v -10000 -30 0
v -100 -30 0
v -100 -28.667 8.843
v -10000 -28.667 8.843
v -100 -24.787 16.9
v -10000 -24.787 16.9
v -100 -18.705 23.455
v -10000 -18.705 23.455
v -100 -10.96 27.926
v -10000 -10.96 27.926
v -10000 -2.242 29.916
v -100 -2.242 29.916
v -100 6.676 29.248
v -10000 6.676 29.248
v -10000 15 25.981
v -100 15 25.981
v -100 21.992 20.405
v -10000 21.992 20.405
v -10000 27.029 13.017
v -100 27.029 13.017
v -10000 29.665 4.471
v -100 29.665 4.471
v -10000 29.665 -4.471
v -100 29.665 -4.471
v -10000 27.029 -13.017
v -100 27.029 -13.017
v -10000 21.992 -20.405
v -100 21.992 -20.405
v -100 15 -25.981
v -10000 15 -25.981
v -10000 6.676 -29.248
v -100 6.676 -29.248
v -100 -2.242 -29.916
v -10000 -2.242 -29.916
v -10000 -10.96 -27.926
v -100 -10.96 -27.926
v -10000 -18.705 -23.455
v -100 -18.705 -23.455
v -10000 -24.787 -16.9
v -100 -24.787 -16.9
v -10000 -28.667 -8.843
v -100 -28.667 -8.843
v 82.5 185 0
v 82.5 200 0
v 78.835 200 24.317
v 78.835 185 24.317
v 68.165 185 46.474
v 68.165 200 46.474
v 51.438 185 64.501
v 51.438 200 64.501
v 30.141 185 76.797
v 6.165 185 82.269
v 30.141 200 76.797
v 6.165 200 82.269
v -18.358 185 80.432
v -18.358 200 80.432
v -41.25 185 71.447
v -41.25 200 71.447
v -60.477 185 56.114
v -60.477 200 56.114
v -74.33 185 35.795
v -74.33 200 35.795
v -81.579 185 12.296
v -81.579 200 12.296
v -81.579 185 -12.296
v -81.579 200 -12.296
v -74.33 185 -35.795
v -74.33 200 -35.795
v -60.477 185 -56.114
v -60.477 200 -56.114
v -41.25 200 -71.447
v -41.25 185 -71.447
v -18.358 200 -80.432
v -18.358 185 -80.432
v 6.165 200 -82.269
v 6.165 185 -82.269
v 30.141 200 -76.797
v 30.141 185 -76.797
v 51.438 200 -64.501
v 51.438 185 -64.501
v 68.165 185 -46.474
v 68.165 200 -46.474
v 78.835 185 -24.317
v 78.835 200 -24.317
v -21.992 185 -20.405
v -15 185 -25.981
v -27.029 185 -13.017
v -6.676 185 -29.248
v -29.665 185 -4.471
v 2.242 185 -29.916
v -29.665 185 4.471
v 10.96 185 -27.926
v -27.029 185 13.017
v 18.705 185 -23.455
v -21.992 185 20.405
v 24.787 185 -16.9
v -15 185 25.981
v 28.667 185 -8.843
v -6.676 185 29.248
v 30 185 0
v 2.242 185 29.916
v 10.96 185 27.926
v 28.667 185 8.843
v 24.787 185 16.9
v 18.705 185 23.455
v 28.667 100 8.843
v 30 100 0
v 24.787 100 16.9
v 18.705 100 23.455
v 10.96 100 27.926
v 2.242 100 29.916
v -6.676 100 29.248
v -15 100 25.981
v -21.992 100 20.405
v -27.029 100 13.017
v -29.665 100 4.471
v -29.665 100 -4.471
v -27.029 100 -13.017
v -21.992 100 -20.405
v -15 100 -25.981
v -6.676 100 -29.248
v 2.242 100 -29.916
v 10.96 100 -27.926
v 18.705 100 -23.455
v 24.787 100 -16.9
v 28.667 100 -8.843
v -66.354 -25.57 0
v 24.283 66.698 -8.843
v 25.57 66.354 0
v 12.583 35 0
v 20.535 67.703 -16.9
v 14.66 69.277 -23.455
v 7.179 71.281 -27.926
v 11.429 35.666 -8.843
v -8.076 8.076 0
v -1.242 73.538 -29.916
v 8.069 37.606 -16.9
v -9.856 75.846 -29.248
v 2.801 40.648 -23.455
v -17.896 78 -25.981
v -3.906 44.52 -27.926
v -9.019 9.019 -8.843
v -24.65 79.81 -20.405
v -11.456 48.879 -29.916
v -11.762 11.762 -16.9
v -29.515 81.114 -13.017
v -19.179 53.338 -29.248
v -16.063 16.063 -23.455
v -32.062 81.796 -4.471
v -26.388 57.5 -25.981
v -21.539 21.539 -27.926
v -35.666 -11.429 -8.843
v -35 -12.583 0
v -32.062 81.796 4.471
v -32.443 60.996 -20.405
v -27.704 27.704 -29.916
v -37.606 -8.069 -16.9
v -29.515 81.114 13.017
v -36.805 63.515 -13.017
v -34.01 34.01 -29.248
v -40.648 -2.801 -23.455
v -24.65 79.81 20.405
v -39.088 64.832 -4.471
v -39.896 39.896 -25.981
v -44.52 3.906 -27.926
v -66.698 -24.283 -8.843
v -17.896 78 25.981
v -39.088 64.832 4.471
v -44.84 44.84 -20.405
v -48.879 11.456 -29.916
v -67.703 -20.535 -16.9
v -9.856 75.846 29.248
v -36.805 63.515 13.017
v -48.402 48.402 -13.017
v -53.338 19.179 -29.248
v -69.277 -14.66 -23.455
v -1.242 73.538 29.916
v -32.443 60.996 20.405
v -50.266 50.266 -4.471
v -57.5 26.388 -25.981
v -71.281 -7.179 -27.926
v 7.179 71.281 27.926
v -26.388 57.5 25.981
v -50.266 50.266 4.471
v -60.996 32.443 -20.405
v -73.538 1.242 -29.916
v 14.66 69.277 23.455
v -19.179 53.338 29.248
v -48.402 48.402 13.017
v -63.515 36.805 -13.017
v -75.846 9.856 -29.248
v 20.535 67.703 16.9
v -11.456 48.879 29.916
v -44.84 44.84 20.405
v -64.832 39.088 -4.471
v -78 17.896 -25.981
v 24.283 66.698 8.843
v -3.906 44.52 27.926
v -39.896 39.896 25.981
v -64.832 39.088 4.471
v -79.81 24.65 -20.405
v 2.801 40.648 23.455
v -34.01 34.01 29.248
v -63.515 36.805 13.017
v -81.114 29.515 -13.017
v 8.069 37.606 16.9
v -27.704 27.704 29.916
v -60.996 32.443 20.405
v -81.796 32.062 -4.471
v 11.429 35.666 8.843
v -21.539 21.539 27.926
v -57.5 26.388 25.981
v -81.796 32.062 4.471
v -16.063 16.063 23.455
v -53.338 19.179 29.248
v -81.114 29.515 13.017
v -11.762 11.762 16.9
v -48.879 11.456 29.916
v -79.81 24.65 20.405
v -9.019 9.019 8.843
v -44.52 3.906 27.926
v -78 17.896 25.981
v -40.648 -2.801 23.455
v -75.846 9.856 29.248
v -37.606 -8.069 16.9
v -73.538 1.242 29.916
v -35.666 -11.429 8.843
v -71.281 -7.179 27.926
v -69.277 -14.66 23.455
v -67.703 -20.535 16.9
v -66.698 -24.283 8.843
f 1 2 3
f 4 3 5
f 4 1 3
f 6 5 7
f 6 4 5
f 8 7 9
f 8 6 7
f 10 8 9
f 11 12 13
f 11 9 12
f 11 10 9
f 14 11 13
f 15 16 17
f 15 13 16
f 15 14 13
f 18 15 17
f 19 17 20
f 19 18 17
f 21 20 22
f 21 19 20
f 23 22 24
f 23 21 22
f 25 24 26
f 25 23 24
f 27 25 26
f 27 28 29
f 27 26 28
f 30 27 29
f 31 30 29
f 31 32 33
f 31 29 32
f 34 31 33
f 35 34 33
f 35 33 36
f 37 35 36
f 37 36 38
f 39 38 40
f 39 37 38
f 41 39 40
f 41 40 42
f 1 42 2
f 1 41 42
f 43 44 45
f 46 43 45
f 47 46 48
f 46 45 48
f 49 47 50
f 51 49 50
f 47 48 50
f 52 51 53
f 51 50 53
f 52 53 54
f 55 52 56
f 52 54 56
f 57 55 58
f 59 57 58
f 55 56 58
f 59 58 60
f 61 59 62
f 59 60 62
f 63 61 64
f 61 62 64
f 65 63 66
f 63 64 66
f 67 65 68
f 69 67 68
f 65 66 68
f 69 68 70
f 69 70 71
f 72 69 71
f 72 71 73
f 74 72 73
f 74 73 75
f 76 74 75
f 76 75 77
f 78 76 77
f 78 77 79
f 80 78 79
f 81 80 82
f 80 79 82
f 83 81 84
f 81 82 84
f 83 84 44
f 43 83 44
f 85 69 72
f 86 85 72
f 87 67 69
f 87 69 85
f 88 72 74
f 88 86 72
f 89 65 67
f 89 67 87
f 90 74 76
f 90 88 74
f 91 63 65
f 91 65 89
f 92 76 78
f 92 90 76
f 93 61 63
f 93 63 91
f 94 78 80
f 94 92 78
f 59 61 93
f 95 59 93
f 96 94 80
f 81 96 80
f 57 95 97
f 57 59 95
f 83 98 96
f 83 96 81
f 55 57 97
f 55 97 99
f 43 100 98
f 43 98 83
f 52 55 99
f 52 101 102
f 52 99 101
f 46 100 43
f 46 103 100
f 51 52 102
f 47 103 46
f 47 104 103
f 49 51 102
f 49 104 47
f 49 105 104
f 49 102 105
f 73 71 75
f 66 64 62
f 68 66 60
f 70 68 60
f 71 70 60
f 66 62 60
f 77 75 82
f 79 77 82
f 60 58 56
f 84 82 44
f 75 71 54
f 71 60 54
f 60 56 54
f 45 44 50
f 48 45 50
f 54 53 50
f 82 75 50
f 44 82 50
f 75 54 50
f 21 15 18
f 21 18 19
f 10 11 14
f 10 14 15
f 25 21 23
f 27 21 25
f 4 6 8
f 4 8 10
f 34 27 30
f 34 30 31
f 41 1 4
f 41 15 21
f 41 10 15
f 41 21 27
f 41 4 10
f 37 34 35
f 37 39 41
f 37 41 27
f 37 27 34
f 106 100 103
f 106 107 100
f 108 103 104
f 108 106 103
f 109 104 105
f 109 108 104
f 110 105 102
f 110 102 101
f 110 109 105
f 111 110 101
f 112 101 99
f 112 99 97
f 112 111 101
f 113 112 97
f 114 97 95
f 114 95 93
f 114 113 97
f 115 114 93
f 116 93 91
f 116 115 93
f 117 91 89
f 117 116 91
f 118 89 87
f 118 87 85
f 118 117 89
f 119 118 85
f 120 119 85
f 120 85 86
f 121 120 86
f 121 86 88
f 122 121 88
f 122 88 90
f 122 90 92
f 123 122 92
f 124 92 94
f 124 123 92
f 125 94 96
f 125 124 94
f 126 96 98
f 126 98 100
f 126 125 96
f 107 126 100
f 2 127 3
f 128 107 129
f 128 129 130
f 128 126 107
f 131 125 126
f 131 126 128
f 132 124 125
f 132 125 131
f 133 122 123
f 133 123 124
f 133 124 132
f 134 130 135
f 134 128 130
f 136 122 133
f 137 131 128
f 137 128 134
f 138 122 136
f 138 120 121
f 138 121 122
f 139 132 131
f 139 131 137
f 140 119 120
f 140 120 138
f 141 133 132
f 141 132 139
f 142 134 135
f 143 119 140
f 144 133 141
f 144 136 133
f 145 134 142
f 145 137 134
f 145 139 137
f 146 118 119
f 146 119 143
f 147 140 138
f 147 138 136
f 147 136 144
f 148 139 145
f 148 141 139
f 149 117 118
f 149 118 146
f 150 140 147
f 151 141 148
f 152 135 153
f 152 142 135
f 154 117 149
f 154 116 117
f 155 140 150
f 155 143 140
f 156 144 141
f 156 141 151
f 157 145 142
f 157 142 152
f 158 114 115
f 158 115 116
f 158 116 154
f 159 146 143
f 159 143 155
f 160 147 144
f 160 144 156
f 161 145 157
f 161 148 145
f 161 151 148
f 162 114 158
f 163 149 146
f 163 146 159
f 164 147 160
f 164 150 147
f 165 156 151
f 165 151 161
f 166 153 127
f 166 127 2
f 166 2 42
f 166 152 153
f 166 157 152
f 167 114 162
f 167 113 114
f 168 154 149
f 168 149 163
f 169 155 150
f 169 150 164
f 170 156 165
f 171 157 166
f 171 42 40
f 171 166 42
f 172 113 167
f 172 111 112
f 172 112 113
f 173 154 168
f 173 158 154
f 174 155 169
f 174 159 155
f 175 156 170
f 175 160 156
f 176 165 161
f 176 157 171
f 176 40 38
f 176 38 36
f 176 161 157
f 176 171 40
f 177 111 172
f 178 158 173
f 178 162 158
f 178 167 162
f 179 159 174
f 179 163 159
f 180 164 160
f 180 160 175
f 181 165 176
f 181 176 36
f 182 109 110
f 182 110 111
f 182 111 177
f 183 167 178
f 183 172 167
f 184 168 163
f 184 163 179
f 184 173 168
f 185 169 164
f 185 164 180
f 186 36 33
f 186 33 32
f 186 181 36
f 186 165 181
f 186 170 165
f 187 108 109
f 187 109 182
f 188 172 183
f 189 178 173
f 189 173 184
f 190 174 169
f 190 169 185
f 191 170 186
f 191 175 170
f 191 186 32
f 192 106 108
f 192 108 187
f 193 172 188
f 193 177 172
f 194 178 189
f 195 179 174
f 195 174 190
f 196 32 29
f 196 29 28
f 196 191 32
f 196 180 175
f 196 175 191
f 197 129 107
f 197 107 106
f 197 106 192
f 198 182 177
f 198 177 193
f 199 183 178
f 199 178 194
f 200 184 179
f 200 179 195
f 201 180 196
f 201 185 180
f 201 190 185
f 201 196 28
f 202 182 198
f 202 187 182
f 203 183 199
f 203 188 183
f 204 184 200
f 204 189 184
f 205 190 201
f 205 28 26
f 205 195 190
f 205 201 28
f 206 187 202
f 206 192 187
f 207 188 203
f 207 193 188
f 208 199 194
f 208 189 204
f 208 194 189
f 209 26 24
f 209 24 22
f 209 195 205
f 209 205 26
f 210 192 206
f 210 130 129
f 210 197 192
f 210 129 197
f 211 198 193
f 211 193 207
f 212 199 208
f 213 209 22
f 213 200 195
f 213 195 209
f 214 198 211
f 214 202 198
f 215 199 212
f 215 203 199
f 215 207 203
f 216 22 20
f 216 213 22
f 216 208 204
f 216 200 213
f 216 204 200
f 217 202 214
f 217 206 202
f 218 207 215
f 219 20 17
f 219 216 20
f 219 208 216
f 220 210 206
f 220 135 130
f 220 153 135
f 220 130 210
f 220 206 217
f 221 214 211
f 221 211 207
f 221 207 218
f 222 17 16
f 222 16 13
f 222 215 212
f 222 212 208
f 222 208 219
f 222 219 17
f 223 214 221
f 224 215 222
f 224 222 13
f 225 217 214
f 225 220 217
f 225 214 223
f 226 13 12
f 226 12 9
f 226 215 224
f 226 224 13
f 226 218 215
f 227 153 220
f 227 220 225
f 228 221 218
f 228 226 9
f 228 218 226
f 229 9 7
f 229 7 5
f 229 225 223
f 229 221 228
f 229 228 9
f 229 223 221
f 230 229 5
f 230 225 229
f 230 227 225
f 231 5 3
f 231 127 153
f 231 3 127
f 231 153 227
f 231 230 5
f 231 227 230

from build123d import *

# Parameters (mm, degrees)
F2_R     = 30
F2_R_2   = 82.5
F4_DEPTH = 15


with BuildPart() as f3:
    # F3: sweep along a path in F0
    with BuildLine(Plane.XY) as f3_path:
        Line((0, 200), (0, 100))
        ThreePointArc((0, 100), (-29.2893218813, 29.2893218813), (-100, 0))
        Line((-100, 0), (-10000, 0))
    # F2 (on offset) → F3 (sweep)
    with BuildSketch(Plane.XZ.offset(-200)):
        Circle(F2_R)
    sweep(path=f3_path.line)

    # F2 (on offset) → F4 (join)
    with BuildSketch(Plane.XZ.offset(-200)):
        Circle(F2_R_2)
        Circle(F2_R, mode=Mode.SUBTRACT)
    extrude(amount=F4_DEPTH)


solid = f3.part
